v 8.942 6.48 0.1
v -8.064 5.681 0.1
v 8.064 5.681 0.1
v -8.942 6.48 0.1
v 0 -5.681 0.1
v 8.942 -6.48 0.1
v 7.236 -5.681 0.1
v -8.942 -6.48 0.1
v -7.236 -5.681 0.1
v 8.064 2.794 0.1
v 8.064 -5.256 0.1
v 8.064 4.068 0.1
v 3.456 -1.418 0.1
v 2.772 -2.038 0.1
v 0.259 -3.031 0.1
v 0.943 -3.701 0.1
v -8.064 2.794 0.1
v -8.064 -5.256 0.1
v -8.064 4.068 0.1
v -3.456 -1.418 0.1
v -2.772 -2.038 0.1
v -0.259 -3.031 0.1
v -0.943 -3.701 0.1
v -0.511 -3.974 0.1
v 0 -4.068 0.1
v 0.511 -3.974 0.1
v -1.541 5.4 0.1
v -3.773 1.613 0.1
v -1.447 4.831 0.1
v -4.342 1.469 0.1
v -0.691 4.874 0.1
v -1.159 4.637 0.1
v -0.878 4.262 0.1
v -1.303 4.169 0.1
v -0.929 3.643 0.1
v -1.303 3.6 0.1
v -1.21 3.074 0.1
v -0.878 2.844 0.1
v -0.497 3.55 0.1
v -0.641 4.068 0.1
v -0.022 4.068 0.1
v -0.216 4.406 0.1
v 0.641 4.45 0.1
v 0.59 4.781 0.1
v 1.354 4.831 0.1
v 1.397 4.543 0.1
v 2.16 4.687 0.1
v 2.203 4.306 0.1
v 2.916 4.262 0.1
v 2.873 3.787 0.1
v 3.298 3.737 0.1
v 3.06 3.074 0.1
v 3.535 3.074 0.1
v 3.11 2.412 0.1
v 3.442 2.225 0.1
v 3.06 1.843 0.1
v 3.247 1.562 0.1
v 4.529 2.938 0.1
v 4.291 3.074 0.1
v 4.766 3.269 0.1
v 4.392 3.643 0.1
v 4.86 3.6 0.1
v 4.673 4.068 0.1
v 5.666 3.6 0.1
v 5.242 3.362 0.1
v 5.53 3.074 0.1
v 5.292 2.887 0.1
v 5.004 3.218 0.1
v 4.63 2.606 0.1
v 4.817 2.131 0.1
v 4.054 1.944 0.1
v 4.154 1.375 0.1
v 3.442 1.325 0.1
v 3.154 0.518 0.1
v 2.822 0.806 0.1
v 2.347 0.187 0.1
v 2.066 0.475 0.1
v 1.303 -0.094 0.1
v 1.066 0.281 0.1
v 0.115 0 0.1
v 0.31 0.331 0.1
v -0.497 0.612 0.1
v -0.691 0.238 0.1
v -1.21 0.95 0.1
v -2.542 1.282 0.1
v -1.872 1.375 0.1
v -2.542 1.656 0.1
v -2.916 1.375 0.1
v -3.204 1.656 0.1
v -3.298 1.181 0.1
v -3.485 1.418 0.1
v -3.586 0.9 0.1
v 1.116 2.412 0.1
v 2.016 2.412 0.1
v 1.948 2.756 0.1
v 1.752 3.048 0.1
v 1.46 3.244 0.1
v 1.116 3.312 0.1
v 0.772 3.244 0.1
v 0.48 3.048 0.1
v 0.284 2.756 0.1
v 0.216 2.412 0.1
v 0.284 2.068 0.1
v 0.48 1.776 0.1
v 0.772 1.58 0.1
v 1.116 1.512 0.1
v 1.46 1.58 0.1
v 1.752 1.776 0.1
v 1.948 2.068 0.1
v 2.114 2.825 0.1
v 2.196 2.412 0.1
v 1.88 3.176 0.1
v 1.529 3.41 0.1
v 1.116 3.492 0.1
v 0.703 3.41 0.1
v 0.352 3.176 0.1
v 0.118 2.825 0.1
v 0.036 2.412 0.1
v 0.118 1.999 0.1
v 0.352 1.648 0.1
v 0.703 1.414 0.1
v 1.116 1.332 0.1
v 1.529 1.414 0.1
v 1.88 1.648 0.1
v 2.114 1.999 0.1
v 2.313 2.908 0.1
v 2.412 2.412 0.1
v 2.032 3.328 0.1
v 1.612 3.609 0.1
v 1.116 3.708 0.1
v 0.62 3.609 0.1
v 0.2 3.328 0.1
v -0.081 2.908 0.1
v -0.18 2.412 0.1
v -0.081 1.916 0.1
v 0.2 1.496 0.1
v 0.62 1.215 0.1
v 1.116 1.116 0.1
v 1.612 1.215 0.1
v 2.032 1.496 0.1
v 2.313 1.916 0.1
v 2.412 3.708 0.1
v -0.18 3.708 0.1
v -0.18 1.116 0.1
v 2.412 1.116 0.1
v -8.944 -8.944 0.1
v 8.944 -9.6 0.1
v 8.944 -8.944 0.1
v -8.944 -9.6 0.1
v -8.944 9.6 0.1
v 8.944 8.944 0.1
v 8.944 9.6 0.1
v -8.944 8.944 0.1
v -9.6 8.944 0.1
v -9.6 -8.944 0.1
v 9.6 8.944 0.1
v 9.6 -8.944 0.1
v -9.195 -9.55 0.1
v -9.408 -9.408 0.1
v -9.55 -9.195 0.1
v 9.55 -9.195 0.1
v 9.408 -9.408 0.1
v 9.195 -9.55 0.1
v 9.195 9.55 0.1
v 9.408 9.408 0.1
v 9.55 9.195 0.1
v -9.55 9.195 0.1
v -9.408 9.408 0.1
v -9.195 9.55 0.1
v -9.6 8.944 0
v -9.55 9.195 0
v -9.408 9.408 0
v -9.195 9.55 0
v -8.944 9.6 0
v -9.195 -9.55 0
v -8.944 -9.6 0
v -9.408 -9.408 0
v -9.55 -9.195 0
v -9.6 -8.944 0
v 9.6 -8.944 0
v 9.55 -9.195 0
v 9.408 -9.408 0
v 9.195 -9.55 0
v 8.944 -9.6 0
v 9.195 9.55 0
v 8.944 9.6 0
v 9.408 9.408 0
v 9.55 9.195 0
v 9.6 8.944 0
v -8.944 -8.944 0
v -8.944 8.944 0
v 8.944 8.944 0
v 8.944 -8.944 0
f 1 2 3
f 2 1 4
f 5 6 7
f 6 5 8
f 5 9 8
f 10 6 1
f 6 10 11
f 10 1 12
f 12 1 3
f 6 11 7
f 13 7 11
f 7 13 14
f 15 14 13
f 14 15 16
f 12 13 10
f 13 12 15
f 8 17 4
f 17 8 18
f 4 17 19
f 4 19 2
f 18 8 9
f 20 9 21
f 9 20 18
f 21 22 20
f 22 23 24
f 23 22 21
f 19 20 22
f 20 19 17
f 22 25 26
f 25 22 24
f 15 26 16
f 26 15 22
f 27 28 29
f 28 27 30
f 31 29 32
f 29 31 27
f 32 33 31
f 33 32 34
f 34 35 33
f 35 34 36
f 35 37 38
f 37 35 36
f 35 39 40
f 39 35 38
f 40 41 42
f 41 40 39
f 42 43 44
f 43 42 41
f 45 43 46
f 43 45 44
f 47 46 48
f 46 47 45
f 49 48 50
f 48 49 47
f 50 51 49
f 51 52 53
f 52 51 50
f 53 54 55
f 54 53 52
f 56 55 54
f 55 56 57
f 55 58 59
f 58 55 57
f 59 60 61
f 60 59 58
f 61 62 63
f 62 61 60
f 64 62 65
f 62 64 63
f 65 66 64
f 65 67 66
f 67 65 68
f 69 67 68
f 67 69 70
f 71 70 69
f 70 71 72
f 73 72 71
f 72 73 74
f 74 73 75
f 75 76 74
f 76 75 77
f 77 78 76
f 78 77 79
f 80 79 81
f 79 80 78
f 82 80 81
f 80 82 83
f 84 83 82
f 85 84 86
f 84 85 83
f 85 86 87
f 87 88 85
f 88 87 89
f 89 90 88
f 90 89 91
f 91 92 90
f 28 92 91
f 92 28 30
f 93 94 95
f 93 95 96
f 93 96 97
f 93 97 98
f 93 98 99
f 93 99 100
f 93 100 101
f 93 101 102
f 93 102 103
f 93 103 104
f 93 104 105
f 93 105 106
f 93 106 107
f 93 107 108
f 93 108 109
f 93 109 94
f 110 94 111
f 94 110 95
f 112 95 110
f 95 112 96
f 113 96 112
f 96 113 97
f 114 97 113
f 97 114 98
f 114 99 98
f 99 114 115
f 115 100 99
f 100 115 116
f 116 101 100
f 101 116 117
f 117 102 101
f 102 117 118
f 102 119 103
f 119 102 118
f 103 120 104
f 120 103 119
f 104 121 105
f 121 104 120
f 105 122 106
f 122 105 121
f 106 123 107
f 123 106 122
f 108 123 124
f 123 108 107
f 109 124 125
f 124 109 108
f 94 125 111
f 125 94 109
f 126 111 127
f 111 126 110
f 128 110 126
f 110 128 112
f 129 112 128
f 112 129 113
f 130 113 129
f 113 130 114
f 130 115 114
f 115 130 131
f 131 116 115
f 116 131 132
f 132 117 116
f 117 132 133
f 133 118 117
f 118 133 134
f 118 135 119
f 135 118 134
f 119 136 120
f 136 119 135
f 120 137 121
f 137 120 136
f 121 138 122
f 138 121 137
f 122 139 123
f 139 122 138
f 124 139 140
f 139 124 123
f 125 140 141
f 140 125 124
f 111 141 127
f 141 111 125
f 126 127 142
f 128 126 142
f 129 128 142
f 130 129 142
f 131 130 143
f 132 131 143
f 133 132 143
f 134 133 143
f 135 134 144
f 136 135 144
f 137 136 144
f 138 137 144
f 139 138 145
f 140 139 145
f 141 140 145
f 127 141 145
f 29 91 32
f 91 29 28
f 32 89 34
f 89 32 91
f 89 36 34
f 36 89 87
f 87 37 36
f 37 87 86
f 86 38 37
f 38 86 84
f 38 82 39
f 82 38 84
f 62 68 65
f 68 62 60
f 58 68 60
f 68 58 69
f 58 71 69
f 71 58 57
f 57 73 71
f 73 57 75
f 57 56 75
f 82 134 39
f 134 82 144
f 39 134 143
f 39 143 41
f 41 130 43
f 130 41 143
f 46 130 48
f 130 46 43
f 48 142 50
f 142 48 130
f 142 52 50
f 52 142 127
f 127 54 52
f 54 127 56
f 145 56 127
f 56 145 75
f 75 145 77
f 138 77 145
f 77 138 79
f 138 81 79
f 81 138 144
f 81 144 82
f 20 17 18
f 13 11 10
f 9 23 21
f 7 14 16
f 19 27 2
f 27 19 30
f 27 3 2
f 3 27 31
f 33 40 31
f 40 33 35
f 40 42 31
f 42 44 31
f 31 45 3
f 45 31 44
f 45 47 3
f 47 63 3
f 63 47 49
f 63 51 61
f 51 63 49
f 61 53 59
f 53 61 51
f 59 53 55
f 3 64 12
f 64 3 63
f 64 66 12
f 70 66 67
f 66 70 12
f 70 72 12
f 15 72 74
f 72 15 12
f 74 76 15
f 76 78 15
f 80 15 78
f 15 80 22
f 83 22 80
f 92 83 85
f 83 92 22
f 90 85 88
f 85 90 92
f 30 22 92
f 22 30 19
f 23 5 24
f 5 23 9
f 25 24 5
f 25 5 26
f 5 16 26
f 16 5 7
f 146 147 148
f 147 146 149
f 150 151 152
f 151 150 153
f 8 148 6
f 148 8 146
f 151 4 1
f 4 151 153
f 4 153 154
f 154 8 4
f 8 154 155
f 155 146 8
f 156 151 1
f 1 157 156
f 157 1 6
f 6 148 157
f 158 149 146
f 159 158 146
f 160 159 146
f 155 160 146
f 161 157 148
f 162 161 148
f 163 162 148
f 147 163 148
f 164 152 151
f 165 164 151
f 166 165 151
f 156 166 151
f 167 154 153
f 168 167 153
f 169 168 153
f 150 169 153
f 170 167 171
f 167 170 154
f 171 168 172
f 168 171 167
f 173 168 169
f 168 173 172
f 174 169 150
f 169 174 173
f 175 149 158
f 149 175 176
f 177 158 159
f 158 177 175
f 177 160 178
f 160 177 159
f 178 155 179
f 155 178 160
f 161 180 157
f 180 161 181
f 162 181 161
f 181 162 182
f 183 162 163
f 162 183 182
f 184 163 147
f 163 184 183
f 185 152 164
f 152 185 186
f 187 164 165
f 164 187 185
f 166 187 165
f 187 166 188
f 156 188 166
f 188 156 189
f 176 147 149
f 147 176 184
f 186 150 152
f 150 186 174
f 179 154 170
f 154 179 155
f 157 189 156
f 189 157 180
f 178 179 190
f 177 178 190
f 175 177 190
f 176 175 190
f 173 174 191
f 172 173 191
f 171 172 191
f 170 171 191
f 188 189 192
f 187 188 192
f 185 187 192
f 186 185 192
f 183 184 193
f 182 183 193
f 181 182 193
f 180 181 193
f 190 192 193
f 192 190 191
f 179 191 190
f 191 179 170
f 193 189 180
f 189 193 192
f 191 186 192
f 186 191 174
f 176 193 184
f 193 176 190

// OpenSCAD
// file: ../p/4-4ring5.scad
use <../lib.scad>
function ldraw_lib__4_4ring5() = [
// 0 Ring  5 x 1.0
// 0 Name: 4-4ring5.dat
// 0 Author: Mark Kennedy [mkennedy]
// 0 !LDRAW_ORG Primitive UPDATE 2012-01
// 0 !LICENSE Licensed under CC BY 2.0 and CC BY 4.0 : see CAreadme.txt
// 
// 0 BFC CERTIFY CCW
  [0,"BFC","CERTIFY"],
  [0,"BFC","CCW"],
// 
// 0 !HISTORY 2001-10-23 [pneaster] resequenced quads, corrected winding.
// 0 !HISTORY 2001-12-29 [pneaster] Added BFC.
// 0 !HISTORY 2002-04-25 [PTadmin] Official Update 2002-02
// 0 !HISTORY 2007-06-24 [PTadmin] Header formatted for Contributor Agreement
// 0 !HISTORY 2008-07-01 [PTadmin] Official Update 2008-01
// 0 !HISTORY 2012-02-16 [Philo] Changed to CCW
// 0 !HISTORY 2012-03-30 [PTadmin] Official Update 2012-01
// 
// 
// 4 16 6 0 0 5.5433 0 2.2961 4.6195 0 1.9135 5 0 0
  [4,16,6,0,0,5.5433,0,2.2961,4.6195,0,1.9135,5,0,0],
// 4 16 5.5433 0 2.2961 4.2426 0 4.2426 3.5355 0 3.5355 4.6195 0 1.9135
  [4,16,5.5433,0,2.2961,4.2426,0,4.2426,3.5355,0,3.5355,4.6195,0,1.9135],
// 4 16 4.2426 0 4.2426 2.2961 0 5.5433 1.9135 0 4.6195 3.5355 0 3.5355
  [4,16,4.2426,0,4.2426,2.2961,0,5.5433,1.9135,0,4.6195,3.5355,0,3.5355],
// 4 16 2.2961 0 5.5433 0 0 6 0 0 5 1.9135 0 4.6195
  [4,16,2.2961,0,5.5433,0,0,6,0,0,5,1.9135,0,4.6195],
// 4 16 0 0 6 -2.2961 0 5.5433 -1.9135 0 4.6195 0 0 5
  [4,16,0,0,6,-2.2961,0,5.5433,-1.9135,0,4.6195,0,0,5],
// 4 16 -2.2961 0 5.5433 -4.2426 0 4.2426 -3.5355 0 3.5355 -1.9135 0 4.6195
  [4,16,-2.2961,0,5.5433,-4.2426,0,4.2426,-3.5355,0,3.5355,-1.9135,0,4.6195],
// 4 16 -4.2426 0 4.2426 -5.5433 0 2.2961 -4.6195 0 1.9135 -3.5355 0 3.5355
  [4,16,-4.2426,0,4.2426,-5.5433,0,2.2961,-4.6195,0,1.9135,-3.5355,0,3.5355],
// 4 16 -5.5433 0 2.2961 -6 0 0 -5 0 0 -4.6195 0 1.9135
  [4,16,-5.5433,0,2.2961,-6,0,0,-5,0,0,-4.6195,0,1.9135],
// 4 16 -6 0 0 -5.5433 0 -2.2961 -4.6195 0 -1.9135 -5 0 0
  [4,16,-6,0,0,-5.5433,0,-2.2961,-4.6195,0,-1.9135,-5,0,0],
// 4 16 -5.5433 0 -2.2961 -4.2426 0 -4.2426 -3.5355 0 -3.5355 -4.6195 0 -1.9135
  [4,16,-5.5433,0,-2.2961,-4.2426,0,-4.2426,-3.5355,0,-3.5355,-4.6195,0,-1.9135],
// 4 16 -4.2426 0 -4.2426 -2.2961 0 -5.5433 -1.9135 0 -4.6195 -3.5355 0 -3.5355
  [4,16,-4.2426,0,-4.2426,-2.2961,0,-5.5433,-1.9135,0,-4.6195,-3.5355,0,-3.5355],
// 4 16 -2.2961 0 -5.5433 0 0 -6 0 0 -5 -1.9135 0 -4.6195
  [4,16,-2.2961,0,-5.5433,0,0,-6,0,0,-5,-1.9135,0,-4.6195],
// 4 16 0 0 -6 2.2961 0 -5.5433 1.9135 0 -4.6195 0 0 -5
  [4,16,0,0,-6,2.2961,0,-5.5433,1.9135,0,-4.6195,0,0,-5],
// 4 16 2.2961 0 -5.5433 4.2426 0 -4.2426 3.5355 0 -3.5355 1.9135 0 -4.6195
  [4,16,2.2961,0,-5.5433,4.2426,0,-4.2426,3.5355,0,-3.5355,1.9135,0,-4.6195],
// 4 16 4.2426 0 -4.2426 5.5433 0 -2.2961 4.6195 0 -1.9135 3.5355 0 -3.5355
  [4,16,4.2426,0,-4.2426,5.5433,0,-2.2961,4.6195,0,-1.9135,3.5355,0,-3.5355],
// 4 16 5.5433 0 -2.2961 6 0 0 5 0 0 4.6195 0 -1.9135
  [4,16,5.5433,0,-2.2961,6,0,0,5,0,0,4.6195,0,-1.9135],
];
makepoly(ldraw_lib__4_4ring5(), line=0.2);
// file: ../p/4-4ndis.scad
use <../lib.scad>
function ldraw_lib__4_4ndis() = [
// 0 Disc Negative 1.0
// 0 Name: 4-4ndis.dat
// 0 Author: James Jessiman
// 0 !LDRAW_ORG Primitive UPDATE 2012-01
// 0 !LICENSE Licensed under CC BY 2.0 and CC BY 4.0 : see CAreadme.txt
// 
// 0 BFC CERTIFY CCW
  [0,"BFC","CERTIFY"],
  [0,"BFC","CCW"],
// 
// 0 !HISTORY 2002-03-23 [sbliss] Added BFC statement; compacted code
// 0 !HISTORY 2002-04-25 [PTadmin] Official Update 2002-02
// 0 !HISTORY 2007-06-24 [PTadmin] Header formatted for Contributor Agreement
// 0 !HISTORY 2008-07-01 [PTadmin] Official Update 2008-01
// 0 !HISTORY 2012-02-16 [Philo] Changed to CCW
// 0 !HISTORY 2012-03-30 [PTadmin] Official Update 2012-01
// 
// 
// 3 16 0.9239 0 0.3827 1 0 0 1 0 1
  [3,16,0.9239,0,0.3827,1,0,0,1,0,1],
// 3 16 0.7071 0 0.7071 0.9239 0 0.3827 1 0 1
  [3,16,0.7071,0,0.7071,0.9239,0,0.3827,1,0,1],
// 3 16 0.3827 0 0.9239 0.7071 0 0.7071 1 0 1
  [3,16,0.3827,0,0.9239,0.7071,0,0.7071,1,0,1],
// 3 16 0 0 1 0.3827 0 0.9239 1 0 1
  [3,16,0,0,1,0.3827,0,0.9239,1,0,1],
// 3 16 -0.3827 0 0.9239 0 0 1 -1 0 1
  [3,16,-0.3827,0,0.9239,0,0,1,-1,0,1],
// 3 16 -0.7071 0 0.7071 -0.3827 0 0.9239 -1 0 1
  [3,16,-0.7071,0,0.7071,-0.3827,0,0.9239,-1,0,1],
// 3 16 -0.9239 0 0.3827 -0.7071 0 0.7071 -1 0 1
  [3,16,-0.9239,0,0.3827,-0.7071,0,0.7071,-1,0,1],
// 3 16 -1 0 0 -0.9239 0 0.3827 -1 0 1
  [3,16,-1,0,0,-0.9239,0,0.3827,-1,0,1],
// 3 16 -0.9239 0 -0.3827 -1 0 0 -1 0 -1
  [3,16,-0.9239,0,-0.3827,-1,0,0,-1,0,-1],
// 3 16 -0.7071 0 -0.7071 -0.9239 0 -0.3827 -1 0 -1
  [3,16,-0.7071,0,-0.7071,-0.9239,0,-0.3827,-1,0,-1],
// 3 16 -0.3827 0 -0.9239 -0.7071 0 -0.7071 -1 0 -1
  [3,16,-0.3827,0,-0.9239,-0.7071,0,-0.7071,-1,0,-1],
// 3 16 0 0 -1 -0.3827 0 -0.9239 -1 0 -1
  [3,16,0,0,-1,-0.3827,0,-0.9239,-1,0,-1],
// 3 16 0.3827 0 -0.9239 0 0 -1 1 0 -1
  [3,16,0.3827,0,-0.9239,0,0,-1,1,0,-1],
// 3 16 0.7071 0 -0.7071 0.3827 0 -0.9239 1 0 -1
  [3,16,0.7071,0,-0.7071,0.3827,0,-0.9239,1,0,-1],
// 3 16 0.9239 0 -0.3827 0.7071 0 -0.7071 1 0 -1
  [3,16,0.9239,0,-0.3827,0.7071,0,-0.7071,1,0,-1],
// 3 16 1 0 0 0.9239 0 -0.3827 1 0 -1
  [3,16,1,0,0,0.9239,0,-0.3827,1,0,-1],
];
makepoly(ldraw_lib__4_4ndis(), line=0.2);
// file: ../p/4-4disc.scad
use <../lib.scad>
function ldraw_lib__4_4disc() = [
// 0 Disc 1.0
// 0 Name: 4-4disc.dat
// 0 Author: James Jessiman
// 0 !LDRAW_ORG Primitive UPDATE 2002-02
// 0 !LICENSE Licensed under CC BY 2.0 and CC BY 4.0 : see CAreadme.txt
// 
// 0 BFC CERTIFY CCW
  [0,"BFC","CERTIFY"],
  [0,"BFC","CCW"],
// 
// 0 !HISTORY 1998-12-15 [PTadmin] Official Update 1998-10
// 0 !HISTORY 2002-03-23 [sbliss] Added BFC statement
// 0 !HISTORY 2002-04-25 [PTadmin] Official Update 2002-02
// 0 !HISTORY 2007-06-24 [PTadmin] Header formatted for Contributor Agreement
// 0 !HISTORY 2008-07-01 [PTadmin] Official Update 2008-01
// 
// 
// 3 16 0 0 0 1 0 0 0.9239 0 0.3827
  [3,16,0,0,0,1,0,0,0.9239,0,0.3827],
// 3 16 0 0 0 0.9239 0 0.3827 0.7071 0 0.7071
  [3,16,0,0,0,0.9239,0,0.3827,0.7071,0,0.7071],
// 3 16 0 0 0 0.7071 0 0.7071 0.3827 0 0.9239
  [3,16,0,0,0,0.7071,0,0.7071,0.3827,0,0.9239],
// 3 16 0 0 0 0.3827 0 0.9239 0 0 1
  [3,16,0,0,0,0.3827,0,0.9239,0,0,1],
// 3 16 0 0 0 0 0 1 -0.3827 0 0.9239
  [3,16,0,0,0,0,0,1,-0.3827,0,0.9239],
// 3 16 0 0 0 -0.3827 0 0.9239 -0.7071 0 0.7071
  [3,16,0,0,0,-0.3827,0,0.9239,-0.7071,0,0.7071],
// 3 16 0 0 0 -0.7071 0 0.7071 -0.9239 0 0.3827
  [3,16,0,0,0,-0.7071,0,0.7071,-0.9239,0,0.3827],
// 3 16 0 0 0 -0.9239 0 0.3827 -1 0 -0
  [3,16,0,0,0,-0.9239,0,0.3827,-1,0,-0],
// 3 16 0 0 0 -1 0 -0 -0.9239 0 -0.3827
  [3,16,0,0,0,-1,0,-0,-0.9239,0,-0.3827],
// 3 16 0 0 0 -0.9239 0 -0.3827 -0.7071 0 -0.7071
  [3,16,0,0,0,-0.9239,0,-0.3827,-0.7071,0,-0.7071],
// 3 16 0 0 0 -0.7071 0 -0.7071 -0.3827 0 -0.9239
  [3,16,0,0,0,-0.7071,0,-0.7071,-0.3827,0,-0.9239],
// 3 16 0 0 0 -0.3827 0 -0.9239 0 0 -1
  [3,16,0,0,0,-0.3827,0,-0.9239,0,0,-1],
// 3 16 0 0 0 0 0 -1 0.3827 0 -0.9239
  [3,16,0,0,0,0,0,-1,0.3827,0,-0.9239],
// 3 16 0 0 0 0.3827 0 -0.9239 0.7071 0 -0.7071
  [3,16,0,0,0,0.3827,0,-0.9239,0.7071,0,-0.7071],
// 3 16 0 0 0 0.7071 0 -0.7071 0.9239 0 -0.3827
  [3,16,0,0,0,0.7071,0,-0.7071,0.9239,0,-0.3827],
// 3 16 0 0 0 0.9239 0 -0.3827 1 0 0
  [3,16,0,0,0,0.9239,0,-0.3827,1,0,0],
// 0
];
makepoly(ldraw_lib__4_4disc(), line=0.2);
// file: ../p/1-4disc.scad
use <../lib.scad>
function ldraw_lib__1_4disc() = [
// 0 Disc 0.25
// 0 Name: 1-4disc.dat
// 0 Author: James Jessiman
// 0 !LDRAW_ORG Primitive UPDATE 2002-02
// 0 !LICENSE Licensed under CC BY 2.0 and CC BY 4.0 : see CAreadme.txt
// 
// 0 BFC CERTIFY CCW
  [0,"BFC","CERTIFY"],
  [0,"BFC","CCW"],
// 
// 0 !HISTORY 2002-03-23 [sbliss] Added BFC statement.
// 0 !HISTORY 2002-04-25 [PTadmin] Official Update 2002-02
// 0 !HISTORY 2007-06-22 [PTadmin] Header formatted for Contributor Agreement
// 0 !HISTORY 2008-07-01 [PTadmin] Official Update 2008-01
// 
// 
// 3 16 0 0 0 1 0 0 0.9239 0 0.3827
  [3,16,0,0,0,1,0,0,0.9239,0,0.3827],
// 3 16 0 0 0 0.9239 0 0.3827 0.7071 0 0.7071
  [3,16,0,0,0,0.9239,0,0.3827,0.7071,0,0.7071],
// 3 16 0 0 0 0.7071 0 0.7071 0.3827 0 0.9239
  [3,16,0,0,0,0.7071,0,0.7071,0.3827,0,0.9239],
// 3 16 0 0 0 0.3827 0 0.9239 0 0 1
  [3,16,0,0,0,0.3827,0,0.9239,0,0,1],
// 0
];
makepoly(ldraw_lib__1_4disc(), line=0.2);
// file: ../p/1-4cyli.scad
use <../lib.scad>
function ldraw_lib__1_4cyli() = [
// 0 Cylinder 0.25
// 0 Name: 1-4cyli.dat
// 0 Author: James Jessiman
// 0 !LDRAW_ORG Primitive UPDATE 2012-01
// 0 !LICENSE Licensed under CC BY 2.0 and CC BY 4.0 : see CAreadme.txt
// 
// 0 BFC CERTIFY CCW
  [0,"BFC","CERTIFY"],
  [0,"BFC","CCW"],
// 
// 0 !HISTORY 2002-03-23 [sbliss] Added BFC statement.
// 0 !HISTORY 2002-04-25 [PTadmin] Official Update 2002-02
// 0 !HISTORY 2007-06-22 [PTadmin] Header formatted for Contributor Agreement
// 0 !HISTORY 2008-07-01 [PTadmin] Official Update 2008-01
// 0 !HISTORY 2012-02-16 [Philo] Changed to CCW
// 0 !HISTORY 2012-03-30 [PTadmin] Official Update 2012-01
// 
// 
// 4 16 1 1 0 0.9239 1 0.3827 0.9239 0 0.3827 1 0 0
  [4,16,1,1,0,0.9239,1,0.3827,0.9239,0,0.3827,1,0,0],
// 5 24 1 0 0 1 1 0 0.9239 0 0.3827 1 0 -1
  [5,24,1,0,0,1,1,0,0.9239,0,0.3827,1,0,-1],
// 4 16 0.9239 1 0.3827 0.7071 1 0.7071 0.7071 0 0.7071 0.9239 0 0.3827
  [4,16,0.9239,1,0.3827,0.7071,1,0.7071,0.7071,0,0.7071,0.9239,0,0.3827],
// 5 24 0.9239 0 0.3827 0.9239 1 0.3827 0.7071 0 0.7071 1 0 0
  [5,24,0.9239,0,0.3827,0.9239,1,0.3827,0.7071,0,0.7071,1,0,0],
// 4 16 0.7071 1 0.7071 0.3827 1 0.9239 0.3827 0 0.9239 0.7071 0 0.7071
  [4,16,0.7071,1,0.7071,0.3827,1,0.9239,0.3827,0,0.9239,0.7071,0,0.7071],
// 5 24 0.7071 0 0.7071 0.7071 1 0.7071 0.3827 0 0.9239 0.9239 0 0.3827
  [5,24,0.7071,0,0.7071,0.7071,1,0.7071,0.3827,0,0.9239,0.9239,0,0.3827],
// 4 16 0.3827 1 0.9239 0 1 1 0 0 1 0.3827 0 0.9239
  [4,16,0.3827,1,0.9239,0,1,1,0,0,1,0.3827,0,0.9239],
// 5 24 0.3827 0 0.9239 0.3827 1 0.9239 0 0 1 0.7071 0 0.7071
  [5,24,0.3827,0,0.9239,0.3827,1,0.9239,0,0,1,0.7071,0,0.7071],
// 5 24 0 0 1 0 1 1 0.3827 0 0.9239 -1 0 1
  [5,24,0,0,1,0,1,1,0.3827,0,0.9239,-1,0,1],
];
makepoly(ldraw_lib__1_4cyli(), line=0.2);
// main file
use <../lib.scad>
use <../p/1-4cyli.scad>
use <../p/1-4disc.scad>
use <s/4346p03b.scad>
function ldraw_lib__195515a() = [
// 0 Sticker  2.4 x  2.4 with Posthorn and Envelope
// 0 Name: 195515a.dat
// 0 Author: Steffen [Steffen]
// 0 !LDRAW_ORG Part UPDATE 2016-01
// 0 !LICENSE Licensed under CC BY 2.0 and CC BY 4.0 : see CAreadme.txt
// 
// 0 BFC CERTIFY CCW
  [0,"BFC","CERTIFY"],
  [0,"BFC","CCW"],
// 
// 0 !HISTORY 2011-07-02 [MagFors] Removed T-junctions
// 0 !HISTORY 2011-07-25 [PTadmin] Official Update 2011-01
// 0 !HISTORY 2016-07-01 [cwdee] Updated description
// 0 !HISTORY 2016-12-31 [PTadmin] Official Update 2016-01
// 
// 
// 1 15 0 -0.25 0 1.8 0 0 0 1.8 0 0 0 1.8 s\4346p03b.dat
  [1,15,0,-0.25,0,1.8,0,0,0,1.8,0,0,0,1.8, ldraw_lib__s__4346p03b()],
// 4 4 -22.359 -0.25 -22.359 -22.359 -0.25 -24 22.359 -0.25 -24 22.359 -0.25 -22.359
  [4,4,-22.359,-0.25,-22.359,-22.359,-0.25,-24,22.359,-0.25,-24,22.359,-0.25,-22.359],
// 4 4 -22.359 -0.25 24 -22.359 -0.25 22.359 22.359 -0.25 22.359 22.359 -0.25 24
  [4,4,-22.359,-0.25,24,-22.359,-0.25,22.359,22.359,-0.25,22.359,22.359,-0.25,24],
// 4 4 -22.356 -0.25 -16.2 -22.359 -0.25 -22.359 22.359 -0.25 -22.359 22.356 -0.25 -16.2
  [4,4,-22.356,-0.25,-16.2,-22.359,-0.25,-22.359,22.359,-0.25,-22.359,22.356,-0.25,-16.2],
// 4 4 -22.359 -0.25 22.359 -22.356 -0.25 16.2 22.356 -0.25 16.2 22.359 -0.25 22.359
  [4,4,-22.359,-0.25,22.359,-22.356,-0.25,16.2,22.356,-0.25,16.2,22.359,-0.25,22.359],
// 3 4 -22.356 -0.25 16.2 -22.359 -0.25 22.359 -24 -0.25 22.359
  [3,4,-22.356,-0.25,16.2,-22.359,-0.25,22.359,-24,-0.25,22.359],
// 4 4 -24 -0.25 22.359 -24 -0.25 -22.359 -22.356 -0.25 -16.2 -22.356 -0.25 16.2
  [4,4,-24,-0.25,22.359,-24,-0.25,-22.359,-22.356,-0.25,-16.2,-22.356,-0.25,16.2],
// 3 4 -24 -0.25 -22.359 -22.359 -0.25 -22.359 -22.356 -0.25 -16.2
  [3,4,-24,-0.25,-22.359,-22.359,-0.25,-22.359,-22.356,-0.25,-16.2],
// 3 4 24 -0.25 22.359 22.359 -0.25 22.359 22.356 -0.25 16.2
  [3,4,24,-0.25,22.359,22.359,-0.25,22.359,22.356,-0.25,16.2],
// 4 4 22.356 -0.25 16.2 22.356 -0.25 -16.2 24 -0.25 -22.359 24 -0.25 22.359
  [4,4,22.356,-0.25,16.2,22.356,-0.25,-16.2,24,-0.25,-22.359,24,-0.25,22.359],
// 3 4 22.356 -0.25 -16.2 22.359 -0.25 -22.359 24 -0.25 -22.359
  [3,4,22.356,-0.25,-16.2,22.359,-0.25,-22.359,24,-0.25,-22.359],
// 1 4 -22.359 -0.25 -22.359 0 0 -1.64094 0 1 0 -1.64094 0 0 1-4disc.dat
  [1,4,-22.359,-0.25,-22.359,0,0,-1.64094,0,1,0,-1.64094,0,0, ldraw_lib__1_4disc()],
// 1 4 22.359 -0.25 -22.359 1.64094 0 0 0 1 0 0 0 -1.64094 1-4disc.dat
  [1,4,22.359,-0.25,-22.359,1.64094,0,0,0,1,0,0,0,-1.64094, ldraw_lib__1_4disc()],
// 1 4 22.359 -0.25 22.359 0 0 1.64094 0 1 0 1.64094 0 0 1-4disc.dat
  [1,4,22.359,-0.25,22.359,0,0,1.64094,0,1,0,1.64094,0,0, ldraw_lib__1_4disc()],
// 1 4 -22.359 -0.25 22.359 -1.64094 0 0 0 1 0 0 0 1.64094 1-4disc.dat
  [1,4,-22.359,-0.25,22.359,-1.64094,0,0,0,1,0,0,0,1.64094, ldraw_lib__1_4disc()],
// 1 4 -22.359 -0.25 22.359 -1.64094 0 0 0 0.25 0 0 0 1.64094 1-4cyli.dat
  [1,4,-22.359,-0.25,22.359,-1.64094,0,0,0,0.25,0,0,0,1.64094, ldraw_lib__1_4cyli()],
// 1 4 -22.359 -0.25 -22.359 0 0 -1.64094 0 0.25 0 -1.64094 0 0 1-4cyli.dat
  [1,4,-22.359,-0.25,-22.359,0,0,-1.64094,0,0.25,0,-1.64094,0,0, ldraw_lib__1_4cyli()],
// 1 4 22.359 -0.25 -22.359 1.64094 0 0 0 0.25 0 0 0 -1.64094 1-4cyli.dat
  [1,4,22.359,-0.25,-22.359,1.64094,0,0,0,0.25,0,0,0,-1.64094, ldraw_lib__1_4cyli()],
// 1 4 22.359 -0.25 22.359 0 0 1.64094 0 0.25 0 1.64094 0 0 1-4cyli.dat
  [1,4,22.359,-0.25,22.359,0,0,1.64094,0,0.25,0,1.64094,0,0, ldraw_lib__1_4cyli()],
// 4 4 22.359 0 -24 22.359 -0.25 -24 -22.359 -0.25 -24 -22.359 0 -24
  [4,4,22.359,0,-24,22.359,-0.25,-24,-22.359,-0.25,-24,-22.359,0,-24],
// 4 4 22.359 -0.25 24 22.359 0 24 -22.359 0 24 -22.359 -0.25 24
  [4,4,22.359,-0.25,24,22.359,0,24,-22.359,0,24,-22.359,-0.25,24],
// 4 4 -24 0 22.359 -24 0 -22.359 -24 -0.25 -22.359 -24 -0.25 22.359
  [4,4,-24,0,22.359,-24,0,-22.359,-24,-0.25,-22.359,-24,-0.25,22.359],
// 4 4 24 -0.25 22.359 24 -0.25 -22.359 24 0 -22.359 24 0 22.359
  [4,4,24,-0.25,22.359,24,-0.25,-22.359,24,0,-22.359,24,0,22.359],
// 1 4 -22.359 0 -22.359 -1.64094 0 0 0 -1 0 0 0 -1.64094 1-4disc.dat
  [1,4,-22.359,0,-22.359,-1.64094,0,0,0,-1,0,0,0,-1.64094, ldraw_lib__1_4disc()],
// 1 4 -22.359 0 22.359 0 0 -1.64094 0 -1 0 1.64094 0 0 1-4disc.dat
  [1,4,-22.359,0,22.359,0,0,-1.64094,0,-1,0,1.64094,0,0, ldraw_lib__1_4disc()],
// 1 4 22.359 0 22.359 1.64094 0 0 0 -1 0 0 0 1.64094 1-4disc.dat
  [1,4,22.359,0,22.359,1.64094,0,0,0,-1,0,0,0,1.64094, ldraw_lib__1_4disc()],
// 1 4 22.359 0 -22.359 0 0 1.64094 0 -1 0 -1.64094 0 0 1-4disc.dat
  [1,4,22.359,0,-22.359,0,0,1.64094,0,-1,0,-1.64094,0,0, ldraw_lib__1_4disc()],
// 4 4 -22.359 0 -22.359 -22.359 0 22.359 22.359 0 22.359 22.359 0 -22.359
  [4,4,-22.359,0,-22.359,-22.359,0,22.359,22.359,0,22.359,22.359,0,-22.359],
// 4 4 -24 0 -22.359 -24 0 22.359 -22.359 0 22.359 -22.359 0 -22.359
  [4,4,-24,0,-22.359,-24,0,22.359,-22.359,0,22.359,-22.359,0,-22.359],
// 4 4 22.359 0 -22.359 22.359 0 22.359 24 0 22.359 24 0 -22.359
  [4,4,22.359,0,-22.359,22.359,0,22.359,24,0,22.359,24,0,-22.359],
// 4 4 -22.359 0 24 22.359 0 24 22.359 0 22.359 -22.359 0 22.359
  [4,4,-22.359,0,24,22.359,0,24,22.359,0,22.359,-22.359,0,22.359],
// 4 4 -22.359 0 -22.359 22.359 0 -22.359 22.359 0 -24 -22.359 0 -24
  [4,4,-22.359,0,-22.359,22.359,0,-22.359,22.359,0,-24,-22.359,0,-24],
];
makepoly(ldraw_lib__195515a(), line=0.2);
